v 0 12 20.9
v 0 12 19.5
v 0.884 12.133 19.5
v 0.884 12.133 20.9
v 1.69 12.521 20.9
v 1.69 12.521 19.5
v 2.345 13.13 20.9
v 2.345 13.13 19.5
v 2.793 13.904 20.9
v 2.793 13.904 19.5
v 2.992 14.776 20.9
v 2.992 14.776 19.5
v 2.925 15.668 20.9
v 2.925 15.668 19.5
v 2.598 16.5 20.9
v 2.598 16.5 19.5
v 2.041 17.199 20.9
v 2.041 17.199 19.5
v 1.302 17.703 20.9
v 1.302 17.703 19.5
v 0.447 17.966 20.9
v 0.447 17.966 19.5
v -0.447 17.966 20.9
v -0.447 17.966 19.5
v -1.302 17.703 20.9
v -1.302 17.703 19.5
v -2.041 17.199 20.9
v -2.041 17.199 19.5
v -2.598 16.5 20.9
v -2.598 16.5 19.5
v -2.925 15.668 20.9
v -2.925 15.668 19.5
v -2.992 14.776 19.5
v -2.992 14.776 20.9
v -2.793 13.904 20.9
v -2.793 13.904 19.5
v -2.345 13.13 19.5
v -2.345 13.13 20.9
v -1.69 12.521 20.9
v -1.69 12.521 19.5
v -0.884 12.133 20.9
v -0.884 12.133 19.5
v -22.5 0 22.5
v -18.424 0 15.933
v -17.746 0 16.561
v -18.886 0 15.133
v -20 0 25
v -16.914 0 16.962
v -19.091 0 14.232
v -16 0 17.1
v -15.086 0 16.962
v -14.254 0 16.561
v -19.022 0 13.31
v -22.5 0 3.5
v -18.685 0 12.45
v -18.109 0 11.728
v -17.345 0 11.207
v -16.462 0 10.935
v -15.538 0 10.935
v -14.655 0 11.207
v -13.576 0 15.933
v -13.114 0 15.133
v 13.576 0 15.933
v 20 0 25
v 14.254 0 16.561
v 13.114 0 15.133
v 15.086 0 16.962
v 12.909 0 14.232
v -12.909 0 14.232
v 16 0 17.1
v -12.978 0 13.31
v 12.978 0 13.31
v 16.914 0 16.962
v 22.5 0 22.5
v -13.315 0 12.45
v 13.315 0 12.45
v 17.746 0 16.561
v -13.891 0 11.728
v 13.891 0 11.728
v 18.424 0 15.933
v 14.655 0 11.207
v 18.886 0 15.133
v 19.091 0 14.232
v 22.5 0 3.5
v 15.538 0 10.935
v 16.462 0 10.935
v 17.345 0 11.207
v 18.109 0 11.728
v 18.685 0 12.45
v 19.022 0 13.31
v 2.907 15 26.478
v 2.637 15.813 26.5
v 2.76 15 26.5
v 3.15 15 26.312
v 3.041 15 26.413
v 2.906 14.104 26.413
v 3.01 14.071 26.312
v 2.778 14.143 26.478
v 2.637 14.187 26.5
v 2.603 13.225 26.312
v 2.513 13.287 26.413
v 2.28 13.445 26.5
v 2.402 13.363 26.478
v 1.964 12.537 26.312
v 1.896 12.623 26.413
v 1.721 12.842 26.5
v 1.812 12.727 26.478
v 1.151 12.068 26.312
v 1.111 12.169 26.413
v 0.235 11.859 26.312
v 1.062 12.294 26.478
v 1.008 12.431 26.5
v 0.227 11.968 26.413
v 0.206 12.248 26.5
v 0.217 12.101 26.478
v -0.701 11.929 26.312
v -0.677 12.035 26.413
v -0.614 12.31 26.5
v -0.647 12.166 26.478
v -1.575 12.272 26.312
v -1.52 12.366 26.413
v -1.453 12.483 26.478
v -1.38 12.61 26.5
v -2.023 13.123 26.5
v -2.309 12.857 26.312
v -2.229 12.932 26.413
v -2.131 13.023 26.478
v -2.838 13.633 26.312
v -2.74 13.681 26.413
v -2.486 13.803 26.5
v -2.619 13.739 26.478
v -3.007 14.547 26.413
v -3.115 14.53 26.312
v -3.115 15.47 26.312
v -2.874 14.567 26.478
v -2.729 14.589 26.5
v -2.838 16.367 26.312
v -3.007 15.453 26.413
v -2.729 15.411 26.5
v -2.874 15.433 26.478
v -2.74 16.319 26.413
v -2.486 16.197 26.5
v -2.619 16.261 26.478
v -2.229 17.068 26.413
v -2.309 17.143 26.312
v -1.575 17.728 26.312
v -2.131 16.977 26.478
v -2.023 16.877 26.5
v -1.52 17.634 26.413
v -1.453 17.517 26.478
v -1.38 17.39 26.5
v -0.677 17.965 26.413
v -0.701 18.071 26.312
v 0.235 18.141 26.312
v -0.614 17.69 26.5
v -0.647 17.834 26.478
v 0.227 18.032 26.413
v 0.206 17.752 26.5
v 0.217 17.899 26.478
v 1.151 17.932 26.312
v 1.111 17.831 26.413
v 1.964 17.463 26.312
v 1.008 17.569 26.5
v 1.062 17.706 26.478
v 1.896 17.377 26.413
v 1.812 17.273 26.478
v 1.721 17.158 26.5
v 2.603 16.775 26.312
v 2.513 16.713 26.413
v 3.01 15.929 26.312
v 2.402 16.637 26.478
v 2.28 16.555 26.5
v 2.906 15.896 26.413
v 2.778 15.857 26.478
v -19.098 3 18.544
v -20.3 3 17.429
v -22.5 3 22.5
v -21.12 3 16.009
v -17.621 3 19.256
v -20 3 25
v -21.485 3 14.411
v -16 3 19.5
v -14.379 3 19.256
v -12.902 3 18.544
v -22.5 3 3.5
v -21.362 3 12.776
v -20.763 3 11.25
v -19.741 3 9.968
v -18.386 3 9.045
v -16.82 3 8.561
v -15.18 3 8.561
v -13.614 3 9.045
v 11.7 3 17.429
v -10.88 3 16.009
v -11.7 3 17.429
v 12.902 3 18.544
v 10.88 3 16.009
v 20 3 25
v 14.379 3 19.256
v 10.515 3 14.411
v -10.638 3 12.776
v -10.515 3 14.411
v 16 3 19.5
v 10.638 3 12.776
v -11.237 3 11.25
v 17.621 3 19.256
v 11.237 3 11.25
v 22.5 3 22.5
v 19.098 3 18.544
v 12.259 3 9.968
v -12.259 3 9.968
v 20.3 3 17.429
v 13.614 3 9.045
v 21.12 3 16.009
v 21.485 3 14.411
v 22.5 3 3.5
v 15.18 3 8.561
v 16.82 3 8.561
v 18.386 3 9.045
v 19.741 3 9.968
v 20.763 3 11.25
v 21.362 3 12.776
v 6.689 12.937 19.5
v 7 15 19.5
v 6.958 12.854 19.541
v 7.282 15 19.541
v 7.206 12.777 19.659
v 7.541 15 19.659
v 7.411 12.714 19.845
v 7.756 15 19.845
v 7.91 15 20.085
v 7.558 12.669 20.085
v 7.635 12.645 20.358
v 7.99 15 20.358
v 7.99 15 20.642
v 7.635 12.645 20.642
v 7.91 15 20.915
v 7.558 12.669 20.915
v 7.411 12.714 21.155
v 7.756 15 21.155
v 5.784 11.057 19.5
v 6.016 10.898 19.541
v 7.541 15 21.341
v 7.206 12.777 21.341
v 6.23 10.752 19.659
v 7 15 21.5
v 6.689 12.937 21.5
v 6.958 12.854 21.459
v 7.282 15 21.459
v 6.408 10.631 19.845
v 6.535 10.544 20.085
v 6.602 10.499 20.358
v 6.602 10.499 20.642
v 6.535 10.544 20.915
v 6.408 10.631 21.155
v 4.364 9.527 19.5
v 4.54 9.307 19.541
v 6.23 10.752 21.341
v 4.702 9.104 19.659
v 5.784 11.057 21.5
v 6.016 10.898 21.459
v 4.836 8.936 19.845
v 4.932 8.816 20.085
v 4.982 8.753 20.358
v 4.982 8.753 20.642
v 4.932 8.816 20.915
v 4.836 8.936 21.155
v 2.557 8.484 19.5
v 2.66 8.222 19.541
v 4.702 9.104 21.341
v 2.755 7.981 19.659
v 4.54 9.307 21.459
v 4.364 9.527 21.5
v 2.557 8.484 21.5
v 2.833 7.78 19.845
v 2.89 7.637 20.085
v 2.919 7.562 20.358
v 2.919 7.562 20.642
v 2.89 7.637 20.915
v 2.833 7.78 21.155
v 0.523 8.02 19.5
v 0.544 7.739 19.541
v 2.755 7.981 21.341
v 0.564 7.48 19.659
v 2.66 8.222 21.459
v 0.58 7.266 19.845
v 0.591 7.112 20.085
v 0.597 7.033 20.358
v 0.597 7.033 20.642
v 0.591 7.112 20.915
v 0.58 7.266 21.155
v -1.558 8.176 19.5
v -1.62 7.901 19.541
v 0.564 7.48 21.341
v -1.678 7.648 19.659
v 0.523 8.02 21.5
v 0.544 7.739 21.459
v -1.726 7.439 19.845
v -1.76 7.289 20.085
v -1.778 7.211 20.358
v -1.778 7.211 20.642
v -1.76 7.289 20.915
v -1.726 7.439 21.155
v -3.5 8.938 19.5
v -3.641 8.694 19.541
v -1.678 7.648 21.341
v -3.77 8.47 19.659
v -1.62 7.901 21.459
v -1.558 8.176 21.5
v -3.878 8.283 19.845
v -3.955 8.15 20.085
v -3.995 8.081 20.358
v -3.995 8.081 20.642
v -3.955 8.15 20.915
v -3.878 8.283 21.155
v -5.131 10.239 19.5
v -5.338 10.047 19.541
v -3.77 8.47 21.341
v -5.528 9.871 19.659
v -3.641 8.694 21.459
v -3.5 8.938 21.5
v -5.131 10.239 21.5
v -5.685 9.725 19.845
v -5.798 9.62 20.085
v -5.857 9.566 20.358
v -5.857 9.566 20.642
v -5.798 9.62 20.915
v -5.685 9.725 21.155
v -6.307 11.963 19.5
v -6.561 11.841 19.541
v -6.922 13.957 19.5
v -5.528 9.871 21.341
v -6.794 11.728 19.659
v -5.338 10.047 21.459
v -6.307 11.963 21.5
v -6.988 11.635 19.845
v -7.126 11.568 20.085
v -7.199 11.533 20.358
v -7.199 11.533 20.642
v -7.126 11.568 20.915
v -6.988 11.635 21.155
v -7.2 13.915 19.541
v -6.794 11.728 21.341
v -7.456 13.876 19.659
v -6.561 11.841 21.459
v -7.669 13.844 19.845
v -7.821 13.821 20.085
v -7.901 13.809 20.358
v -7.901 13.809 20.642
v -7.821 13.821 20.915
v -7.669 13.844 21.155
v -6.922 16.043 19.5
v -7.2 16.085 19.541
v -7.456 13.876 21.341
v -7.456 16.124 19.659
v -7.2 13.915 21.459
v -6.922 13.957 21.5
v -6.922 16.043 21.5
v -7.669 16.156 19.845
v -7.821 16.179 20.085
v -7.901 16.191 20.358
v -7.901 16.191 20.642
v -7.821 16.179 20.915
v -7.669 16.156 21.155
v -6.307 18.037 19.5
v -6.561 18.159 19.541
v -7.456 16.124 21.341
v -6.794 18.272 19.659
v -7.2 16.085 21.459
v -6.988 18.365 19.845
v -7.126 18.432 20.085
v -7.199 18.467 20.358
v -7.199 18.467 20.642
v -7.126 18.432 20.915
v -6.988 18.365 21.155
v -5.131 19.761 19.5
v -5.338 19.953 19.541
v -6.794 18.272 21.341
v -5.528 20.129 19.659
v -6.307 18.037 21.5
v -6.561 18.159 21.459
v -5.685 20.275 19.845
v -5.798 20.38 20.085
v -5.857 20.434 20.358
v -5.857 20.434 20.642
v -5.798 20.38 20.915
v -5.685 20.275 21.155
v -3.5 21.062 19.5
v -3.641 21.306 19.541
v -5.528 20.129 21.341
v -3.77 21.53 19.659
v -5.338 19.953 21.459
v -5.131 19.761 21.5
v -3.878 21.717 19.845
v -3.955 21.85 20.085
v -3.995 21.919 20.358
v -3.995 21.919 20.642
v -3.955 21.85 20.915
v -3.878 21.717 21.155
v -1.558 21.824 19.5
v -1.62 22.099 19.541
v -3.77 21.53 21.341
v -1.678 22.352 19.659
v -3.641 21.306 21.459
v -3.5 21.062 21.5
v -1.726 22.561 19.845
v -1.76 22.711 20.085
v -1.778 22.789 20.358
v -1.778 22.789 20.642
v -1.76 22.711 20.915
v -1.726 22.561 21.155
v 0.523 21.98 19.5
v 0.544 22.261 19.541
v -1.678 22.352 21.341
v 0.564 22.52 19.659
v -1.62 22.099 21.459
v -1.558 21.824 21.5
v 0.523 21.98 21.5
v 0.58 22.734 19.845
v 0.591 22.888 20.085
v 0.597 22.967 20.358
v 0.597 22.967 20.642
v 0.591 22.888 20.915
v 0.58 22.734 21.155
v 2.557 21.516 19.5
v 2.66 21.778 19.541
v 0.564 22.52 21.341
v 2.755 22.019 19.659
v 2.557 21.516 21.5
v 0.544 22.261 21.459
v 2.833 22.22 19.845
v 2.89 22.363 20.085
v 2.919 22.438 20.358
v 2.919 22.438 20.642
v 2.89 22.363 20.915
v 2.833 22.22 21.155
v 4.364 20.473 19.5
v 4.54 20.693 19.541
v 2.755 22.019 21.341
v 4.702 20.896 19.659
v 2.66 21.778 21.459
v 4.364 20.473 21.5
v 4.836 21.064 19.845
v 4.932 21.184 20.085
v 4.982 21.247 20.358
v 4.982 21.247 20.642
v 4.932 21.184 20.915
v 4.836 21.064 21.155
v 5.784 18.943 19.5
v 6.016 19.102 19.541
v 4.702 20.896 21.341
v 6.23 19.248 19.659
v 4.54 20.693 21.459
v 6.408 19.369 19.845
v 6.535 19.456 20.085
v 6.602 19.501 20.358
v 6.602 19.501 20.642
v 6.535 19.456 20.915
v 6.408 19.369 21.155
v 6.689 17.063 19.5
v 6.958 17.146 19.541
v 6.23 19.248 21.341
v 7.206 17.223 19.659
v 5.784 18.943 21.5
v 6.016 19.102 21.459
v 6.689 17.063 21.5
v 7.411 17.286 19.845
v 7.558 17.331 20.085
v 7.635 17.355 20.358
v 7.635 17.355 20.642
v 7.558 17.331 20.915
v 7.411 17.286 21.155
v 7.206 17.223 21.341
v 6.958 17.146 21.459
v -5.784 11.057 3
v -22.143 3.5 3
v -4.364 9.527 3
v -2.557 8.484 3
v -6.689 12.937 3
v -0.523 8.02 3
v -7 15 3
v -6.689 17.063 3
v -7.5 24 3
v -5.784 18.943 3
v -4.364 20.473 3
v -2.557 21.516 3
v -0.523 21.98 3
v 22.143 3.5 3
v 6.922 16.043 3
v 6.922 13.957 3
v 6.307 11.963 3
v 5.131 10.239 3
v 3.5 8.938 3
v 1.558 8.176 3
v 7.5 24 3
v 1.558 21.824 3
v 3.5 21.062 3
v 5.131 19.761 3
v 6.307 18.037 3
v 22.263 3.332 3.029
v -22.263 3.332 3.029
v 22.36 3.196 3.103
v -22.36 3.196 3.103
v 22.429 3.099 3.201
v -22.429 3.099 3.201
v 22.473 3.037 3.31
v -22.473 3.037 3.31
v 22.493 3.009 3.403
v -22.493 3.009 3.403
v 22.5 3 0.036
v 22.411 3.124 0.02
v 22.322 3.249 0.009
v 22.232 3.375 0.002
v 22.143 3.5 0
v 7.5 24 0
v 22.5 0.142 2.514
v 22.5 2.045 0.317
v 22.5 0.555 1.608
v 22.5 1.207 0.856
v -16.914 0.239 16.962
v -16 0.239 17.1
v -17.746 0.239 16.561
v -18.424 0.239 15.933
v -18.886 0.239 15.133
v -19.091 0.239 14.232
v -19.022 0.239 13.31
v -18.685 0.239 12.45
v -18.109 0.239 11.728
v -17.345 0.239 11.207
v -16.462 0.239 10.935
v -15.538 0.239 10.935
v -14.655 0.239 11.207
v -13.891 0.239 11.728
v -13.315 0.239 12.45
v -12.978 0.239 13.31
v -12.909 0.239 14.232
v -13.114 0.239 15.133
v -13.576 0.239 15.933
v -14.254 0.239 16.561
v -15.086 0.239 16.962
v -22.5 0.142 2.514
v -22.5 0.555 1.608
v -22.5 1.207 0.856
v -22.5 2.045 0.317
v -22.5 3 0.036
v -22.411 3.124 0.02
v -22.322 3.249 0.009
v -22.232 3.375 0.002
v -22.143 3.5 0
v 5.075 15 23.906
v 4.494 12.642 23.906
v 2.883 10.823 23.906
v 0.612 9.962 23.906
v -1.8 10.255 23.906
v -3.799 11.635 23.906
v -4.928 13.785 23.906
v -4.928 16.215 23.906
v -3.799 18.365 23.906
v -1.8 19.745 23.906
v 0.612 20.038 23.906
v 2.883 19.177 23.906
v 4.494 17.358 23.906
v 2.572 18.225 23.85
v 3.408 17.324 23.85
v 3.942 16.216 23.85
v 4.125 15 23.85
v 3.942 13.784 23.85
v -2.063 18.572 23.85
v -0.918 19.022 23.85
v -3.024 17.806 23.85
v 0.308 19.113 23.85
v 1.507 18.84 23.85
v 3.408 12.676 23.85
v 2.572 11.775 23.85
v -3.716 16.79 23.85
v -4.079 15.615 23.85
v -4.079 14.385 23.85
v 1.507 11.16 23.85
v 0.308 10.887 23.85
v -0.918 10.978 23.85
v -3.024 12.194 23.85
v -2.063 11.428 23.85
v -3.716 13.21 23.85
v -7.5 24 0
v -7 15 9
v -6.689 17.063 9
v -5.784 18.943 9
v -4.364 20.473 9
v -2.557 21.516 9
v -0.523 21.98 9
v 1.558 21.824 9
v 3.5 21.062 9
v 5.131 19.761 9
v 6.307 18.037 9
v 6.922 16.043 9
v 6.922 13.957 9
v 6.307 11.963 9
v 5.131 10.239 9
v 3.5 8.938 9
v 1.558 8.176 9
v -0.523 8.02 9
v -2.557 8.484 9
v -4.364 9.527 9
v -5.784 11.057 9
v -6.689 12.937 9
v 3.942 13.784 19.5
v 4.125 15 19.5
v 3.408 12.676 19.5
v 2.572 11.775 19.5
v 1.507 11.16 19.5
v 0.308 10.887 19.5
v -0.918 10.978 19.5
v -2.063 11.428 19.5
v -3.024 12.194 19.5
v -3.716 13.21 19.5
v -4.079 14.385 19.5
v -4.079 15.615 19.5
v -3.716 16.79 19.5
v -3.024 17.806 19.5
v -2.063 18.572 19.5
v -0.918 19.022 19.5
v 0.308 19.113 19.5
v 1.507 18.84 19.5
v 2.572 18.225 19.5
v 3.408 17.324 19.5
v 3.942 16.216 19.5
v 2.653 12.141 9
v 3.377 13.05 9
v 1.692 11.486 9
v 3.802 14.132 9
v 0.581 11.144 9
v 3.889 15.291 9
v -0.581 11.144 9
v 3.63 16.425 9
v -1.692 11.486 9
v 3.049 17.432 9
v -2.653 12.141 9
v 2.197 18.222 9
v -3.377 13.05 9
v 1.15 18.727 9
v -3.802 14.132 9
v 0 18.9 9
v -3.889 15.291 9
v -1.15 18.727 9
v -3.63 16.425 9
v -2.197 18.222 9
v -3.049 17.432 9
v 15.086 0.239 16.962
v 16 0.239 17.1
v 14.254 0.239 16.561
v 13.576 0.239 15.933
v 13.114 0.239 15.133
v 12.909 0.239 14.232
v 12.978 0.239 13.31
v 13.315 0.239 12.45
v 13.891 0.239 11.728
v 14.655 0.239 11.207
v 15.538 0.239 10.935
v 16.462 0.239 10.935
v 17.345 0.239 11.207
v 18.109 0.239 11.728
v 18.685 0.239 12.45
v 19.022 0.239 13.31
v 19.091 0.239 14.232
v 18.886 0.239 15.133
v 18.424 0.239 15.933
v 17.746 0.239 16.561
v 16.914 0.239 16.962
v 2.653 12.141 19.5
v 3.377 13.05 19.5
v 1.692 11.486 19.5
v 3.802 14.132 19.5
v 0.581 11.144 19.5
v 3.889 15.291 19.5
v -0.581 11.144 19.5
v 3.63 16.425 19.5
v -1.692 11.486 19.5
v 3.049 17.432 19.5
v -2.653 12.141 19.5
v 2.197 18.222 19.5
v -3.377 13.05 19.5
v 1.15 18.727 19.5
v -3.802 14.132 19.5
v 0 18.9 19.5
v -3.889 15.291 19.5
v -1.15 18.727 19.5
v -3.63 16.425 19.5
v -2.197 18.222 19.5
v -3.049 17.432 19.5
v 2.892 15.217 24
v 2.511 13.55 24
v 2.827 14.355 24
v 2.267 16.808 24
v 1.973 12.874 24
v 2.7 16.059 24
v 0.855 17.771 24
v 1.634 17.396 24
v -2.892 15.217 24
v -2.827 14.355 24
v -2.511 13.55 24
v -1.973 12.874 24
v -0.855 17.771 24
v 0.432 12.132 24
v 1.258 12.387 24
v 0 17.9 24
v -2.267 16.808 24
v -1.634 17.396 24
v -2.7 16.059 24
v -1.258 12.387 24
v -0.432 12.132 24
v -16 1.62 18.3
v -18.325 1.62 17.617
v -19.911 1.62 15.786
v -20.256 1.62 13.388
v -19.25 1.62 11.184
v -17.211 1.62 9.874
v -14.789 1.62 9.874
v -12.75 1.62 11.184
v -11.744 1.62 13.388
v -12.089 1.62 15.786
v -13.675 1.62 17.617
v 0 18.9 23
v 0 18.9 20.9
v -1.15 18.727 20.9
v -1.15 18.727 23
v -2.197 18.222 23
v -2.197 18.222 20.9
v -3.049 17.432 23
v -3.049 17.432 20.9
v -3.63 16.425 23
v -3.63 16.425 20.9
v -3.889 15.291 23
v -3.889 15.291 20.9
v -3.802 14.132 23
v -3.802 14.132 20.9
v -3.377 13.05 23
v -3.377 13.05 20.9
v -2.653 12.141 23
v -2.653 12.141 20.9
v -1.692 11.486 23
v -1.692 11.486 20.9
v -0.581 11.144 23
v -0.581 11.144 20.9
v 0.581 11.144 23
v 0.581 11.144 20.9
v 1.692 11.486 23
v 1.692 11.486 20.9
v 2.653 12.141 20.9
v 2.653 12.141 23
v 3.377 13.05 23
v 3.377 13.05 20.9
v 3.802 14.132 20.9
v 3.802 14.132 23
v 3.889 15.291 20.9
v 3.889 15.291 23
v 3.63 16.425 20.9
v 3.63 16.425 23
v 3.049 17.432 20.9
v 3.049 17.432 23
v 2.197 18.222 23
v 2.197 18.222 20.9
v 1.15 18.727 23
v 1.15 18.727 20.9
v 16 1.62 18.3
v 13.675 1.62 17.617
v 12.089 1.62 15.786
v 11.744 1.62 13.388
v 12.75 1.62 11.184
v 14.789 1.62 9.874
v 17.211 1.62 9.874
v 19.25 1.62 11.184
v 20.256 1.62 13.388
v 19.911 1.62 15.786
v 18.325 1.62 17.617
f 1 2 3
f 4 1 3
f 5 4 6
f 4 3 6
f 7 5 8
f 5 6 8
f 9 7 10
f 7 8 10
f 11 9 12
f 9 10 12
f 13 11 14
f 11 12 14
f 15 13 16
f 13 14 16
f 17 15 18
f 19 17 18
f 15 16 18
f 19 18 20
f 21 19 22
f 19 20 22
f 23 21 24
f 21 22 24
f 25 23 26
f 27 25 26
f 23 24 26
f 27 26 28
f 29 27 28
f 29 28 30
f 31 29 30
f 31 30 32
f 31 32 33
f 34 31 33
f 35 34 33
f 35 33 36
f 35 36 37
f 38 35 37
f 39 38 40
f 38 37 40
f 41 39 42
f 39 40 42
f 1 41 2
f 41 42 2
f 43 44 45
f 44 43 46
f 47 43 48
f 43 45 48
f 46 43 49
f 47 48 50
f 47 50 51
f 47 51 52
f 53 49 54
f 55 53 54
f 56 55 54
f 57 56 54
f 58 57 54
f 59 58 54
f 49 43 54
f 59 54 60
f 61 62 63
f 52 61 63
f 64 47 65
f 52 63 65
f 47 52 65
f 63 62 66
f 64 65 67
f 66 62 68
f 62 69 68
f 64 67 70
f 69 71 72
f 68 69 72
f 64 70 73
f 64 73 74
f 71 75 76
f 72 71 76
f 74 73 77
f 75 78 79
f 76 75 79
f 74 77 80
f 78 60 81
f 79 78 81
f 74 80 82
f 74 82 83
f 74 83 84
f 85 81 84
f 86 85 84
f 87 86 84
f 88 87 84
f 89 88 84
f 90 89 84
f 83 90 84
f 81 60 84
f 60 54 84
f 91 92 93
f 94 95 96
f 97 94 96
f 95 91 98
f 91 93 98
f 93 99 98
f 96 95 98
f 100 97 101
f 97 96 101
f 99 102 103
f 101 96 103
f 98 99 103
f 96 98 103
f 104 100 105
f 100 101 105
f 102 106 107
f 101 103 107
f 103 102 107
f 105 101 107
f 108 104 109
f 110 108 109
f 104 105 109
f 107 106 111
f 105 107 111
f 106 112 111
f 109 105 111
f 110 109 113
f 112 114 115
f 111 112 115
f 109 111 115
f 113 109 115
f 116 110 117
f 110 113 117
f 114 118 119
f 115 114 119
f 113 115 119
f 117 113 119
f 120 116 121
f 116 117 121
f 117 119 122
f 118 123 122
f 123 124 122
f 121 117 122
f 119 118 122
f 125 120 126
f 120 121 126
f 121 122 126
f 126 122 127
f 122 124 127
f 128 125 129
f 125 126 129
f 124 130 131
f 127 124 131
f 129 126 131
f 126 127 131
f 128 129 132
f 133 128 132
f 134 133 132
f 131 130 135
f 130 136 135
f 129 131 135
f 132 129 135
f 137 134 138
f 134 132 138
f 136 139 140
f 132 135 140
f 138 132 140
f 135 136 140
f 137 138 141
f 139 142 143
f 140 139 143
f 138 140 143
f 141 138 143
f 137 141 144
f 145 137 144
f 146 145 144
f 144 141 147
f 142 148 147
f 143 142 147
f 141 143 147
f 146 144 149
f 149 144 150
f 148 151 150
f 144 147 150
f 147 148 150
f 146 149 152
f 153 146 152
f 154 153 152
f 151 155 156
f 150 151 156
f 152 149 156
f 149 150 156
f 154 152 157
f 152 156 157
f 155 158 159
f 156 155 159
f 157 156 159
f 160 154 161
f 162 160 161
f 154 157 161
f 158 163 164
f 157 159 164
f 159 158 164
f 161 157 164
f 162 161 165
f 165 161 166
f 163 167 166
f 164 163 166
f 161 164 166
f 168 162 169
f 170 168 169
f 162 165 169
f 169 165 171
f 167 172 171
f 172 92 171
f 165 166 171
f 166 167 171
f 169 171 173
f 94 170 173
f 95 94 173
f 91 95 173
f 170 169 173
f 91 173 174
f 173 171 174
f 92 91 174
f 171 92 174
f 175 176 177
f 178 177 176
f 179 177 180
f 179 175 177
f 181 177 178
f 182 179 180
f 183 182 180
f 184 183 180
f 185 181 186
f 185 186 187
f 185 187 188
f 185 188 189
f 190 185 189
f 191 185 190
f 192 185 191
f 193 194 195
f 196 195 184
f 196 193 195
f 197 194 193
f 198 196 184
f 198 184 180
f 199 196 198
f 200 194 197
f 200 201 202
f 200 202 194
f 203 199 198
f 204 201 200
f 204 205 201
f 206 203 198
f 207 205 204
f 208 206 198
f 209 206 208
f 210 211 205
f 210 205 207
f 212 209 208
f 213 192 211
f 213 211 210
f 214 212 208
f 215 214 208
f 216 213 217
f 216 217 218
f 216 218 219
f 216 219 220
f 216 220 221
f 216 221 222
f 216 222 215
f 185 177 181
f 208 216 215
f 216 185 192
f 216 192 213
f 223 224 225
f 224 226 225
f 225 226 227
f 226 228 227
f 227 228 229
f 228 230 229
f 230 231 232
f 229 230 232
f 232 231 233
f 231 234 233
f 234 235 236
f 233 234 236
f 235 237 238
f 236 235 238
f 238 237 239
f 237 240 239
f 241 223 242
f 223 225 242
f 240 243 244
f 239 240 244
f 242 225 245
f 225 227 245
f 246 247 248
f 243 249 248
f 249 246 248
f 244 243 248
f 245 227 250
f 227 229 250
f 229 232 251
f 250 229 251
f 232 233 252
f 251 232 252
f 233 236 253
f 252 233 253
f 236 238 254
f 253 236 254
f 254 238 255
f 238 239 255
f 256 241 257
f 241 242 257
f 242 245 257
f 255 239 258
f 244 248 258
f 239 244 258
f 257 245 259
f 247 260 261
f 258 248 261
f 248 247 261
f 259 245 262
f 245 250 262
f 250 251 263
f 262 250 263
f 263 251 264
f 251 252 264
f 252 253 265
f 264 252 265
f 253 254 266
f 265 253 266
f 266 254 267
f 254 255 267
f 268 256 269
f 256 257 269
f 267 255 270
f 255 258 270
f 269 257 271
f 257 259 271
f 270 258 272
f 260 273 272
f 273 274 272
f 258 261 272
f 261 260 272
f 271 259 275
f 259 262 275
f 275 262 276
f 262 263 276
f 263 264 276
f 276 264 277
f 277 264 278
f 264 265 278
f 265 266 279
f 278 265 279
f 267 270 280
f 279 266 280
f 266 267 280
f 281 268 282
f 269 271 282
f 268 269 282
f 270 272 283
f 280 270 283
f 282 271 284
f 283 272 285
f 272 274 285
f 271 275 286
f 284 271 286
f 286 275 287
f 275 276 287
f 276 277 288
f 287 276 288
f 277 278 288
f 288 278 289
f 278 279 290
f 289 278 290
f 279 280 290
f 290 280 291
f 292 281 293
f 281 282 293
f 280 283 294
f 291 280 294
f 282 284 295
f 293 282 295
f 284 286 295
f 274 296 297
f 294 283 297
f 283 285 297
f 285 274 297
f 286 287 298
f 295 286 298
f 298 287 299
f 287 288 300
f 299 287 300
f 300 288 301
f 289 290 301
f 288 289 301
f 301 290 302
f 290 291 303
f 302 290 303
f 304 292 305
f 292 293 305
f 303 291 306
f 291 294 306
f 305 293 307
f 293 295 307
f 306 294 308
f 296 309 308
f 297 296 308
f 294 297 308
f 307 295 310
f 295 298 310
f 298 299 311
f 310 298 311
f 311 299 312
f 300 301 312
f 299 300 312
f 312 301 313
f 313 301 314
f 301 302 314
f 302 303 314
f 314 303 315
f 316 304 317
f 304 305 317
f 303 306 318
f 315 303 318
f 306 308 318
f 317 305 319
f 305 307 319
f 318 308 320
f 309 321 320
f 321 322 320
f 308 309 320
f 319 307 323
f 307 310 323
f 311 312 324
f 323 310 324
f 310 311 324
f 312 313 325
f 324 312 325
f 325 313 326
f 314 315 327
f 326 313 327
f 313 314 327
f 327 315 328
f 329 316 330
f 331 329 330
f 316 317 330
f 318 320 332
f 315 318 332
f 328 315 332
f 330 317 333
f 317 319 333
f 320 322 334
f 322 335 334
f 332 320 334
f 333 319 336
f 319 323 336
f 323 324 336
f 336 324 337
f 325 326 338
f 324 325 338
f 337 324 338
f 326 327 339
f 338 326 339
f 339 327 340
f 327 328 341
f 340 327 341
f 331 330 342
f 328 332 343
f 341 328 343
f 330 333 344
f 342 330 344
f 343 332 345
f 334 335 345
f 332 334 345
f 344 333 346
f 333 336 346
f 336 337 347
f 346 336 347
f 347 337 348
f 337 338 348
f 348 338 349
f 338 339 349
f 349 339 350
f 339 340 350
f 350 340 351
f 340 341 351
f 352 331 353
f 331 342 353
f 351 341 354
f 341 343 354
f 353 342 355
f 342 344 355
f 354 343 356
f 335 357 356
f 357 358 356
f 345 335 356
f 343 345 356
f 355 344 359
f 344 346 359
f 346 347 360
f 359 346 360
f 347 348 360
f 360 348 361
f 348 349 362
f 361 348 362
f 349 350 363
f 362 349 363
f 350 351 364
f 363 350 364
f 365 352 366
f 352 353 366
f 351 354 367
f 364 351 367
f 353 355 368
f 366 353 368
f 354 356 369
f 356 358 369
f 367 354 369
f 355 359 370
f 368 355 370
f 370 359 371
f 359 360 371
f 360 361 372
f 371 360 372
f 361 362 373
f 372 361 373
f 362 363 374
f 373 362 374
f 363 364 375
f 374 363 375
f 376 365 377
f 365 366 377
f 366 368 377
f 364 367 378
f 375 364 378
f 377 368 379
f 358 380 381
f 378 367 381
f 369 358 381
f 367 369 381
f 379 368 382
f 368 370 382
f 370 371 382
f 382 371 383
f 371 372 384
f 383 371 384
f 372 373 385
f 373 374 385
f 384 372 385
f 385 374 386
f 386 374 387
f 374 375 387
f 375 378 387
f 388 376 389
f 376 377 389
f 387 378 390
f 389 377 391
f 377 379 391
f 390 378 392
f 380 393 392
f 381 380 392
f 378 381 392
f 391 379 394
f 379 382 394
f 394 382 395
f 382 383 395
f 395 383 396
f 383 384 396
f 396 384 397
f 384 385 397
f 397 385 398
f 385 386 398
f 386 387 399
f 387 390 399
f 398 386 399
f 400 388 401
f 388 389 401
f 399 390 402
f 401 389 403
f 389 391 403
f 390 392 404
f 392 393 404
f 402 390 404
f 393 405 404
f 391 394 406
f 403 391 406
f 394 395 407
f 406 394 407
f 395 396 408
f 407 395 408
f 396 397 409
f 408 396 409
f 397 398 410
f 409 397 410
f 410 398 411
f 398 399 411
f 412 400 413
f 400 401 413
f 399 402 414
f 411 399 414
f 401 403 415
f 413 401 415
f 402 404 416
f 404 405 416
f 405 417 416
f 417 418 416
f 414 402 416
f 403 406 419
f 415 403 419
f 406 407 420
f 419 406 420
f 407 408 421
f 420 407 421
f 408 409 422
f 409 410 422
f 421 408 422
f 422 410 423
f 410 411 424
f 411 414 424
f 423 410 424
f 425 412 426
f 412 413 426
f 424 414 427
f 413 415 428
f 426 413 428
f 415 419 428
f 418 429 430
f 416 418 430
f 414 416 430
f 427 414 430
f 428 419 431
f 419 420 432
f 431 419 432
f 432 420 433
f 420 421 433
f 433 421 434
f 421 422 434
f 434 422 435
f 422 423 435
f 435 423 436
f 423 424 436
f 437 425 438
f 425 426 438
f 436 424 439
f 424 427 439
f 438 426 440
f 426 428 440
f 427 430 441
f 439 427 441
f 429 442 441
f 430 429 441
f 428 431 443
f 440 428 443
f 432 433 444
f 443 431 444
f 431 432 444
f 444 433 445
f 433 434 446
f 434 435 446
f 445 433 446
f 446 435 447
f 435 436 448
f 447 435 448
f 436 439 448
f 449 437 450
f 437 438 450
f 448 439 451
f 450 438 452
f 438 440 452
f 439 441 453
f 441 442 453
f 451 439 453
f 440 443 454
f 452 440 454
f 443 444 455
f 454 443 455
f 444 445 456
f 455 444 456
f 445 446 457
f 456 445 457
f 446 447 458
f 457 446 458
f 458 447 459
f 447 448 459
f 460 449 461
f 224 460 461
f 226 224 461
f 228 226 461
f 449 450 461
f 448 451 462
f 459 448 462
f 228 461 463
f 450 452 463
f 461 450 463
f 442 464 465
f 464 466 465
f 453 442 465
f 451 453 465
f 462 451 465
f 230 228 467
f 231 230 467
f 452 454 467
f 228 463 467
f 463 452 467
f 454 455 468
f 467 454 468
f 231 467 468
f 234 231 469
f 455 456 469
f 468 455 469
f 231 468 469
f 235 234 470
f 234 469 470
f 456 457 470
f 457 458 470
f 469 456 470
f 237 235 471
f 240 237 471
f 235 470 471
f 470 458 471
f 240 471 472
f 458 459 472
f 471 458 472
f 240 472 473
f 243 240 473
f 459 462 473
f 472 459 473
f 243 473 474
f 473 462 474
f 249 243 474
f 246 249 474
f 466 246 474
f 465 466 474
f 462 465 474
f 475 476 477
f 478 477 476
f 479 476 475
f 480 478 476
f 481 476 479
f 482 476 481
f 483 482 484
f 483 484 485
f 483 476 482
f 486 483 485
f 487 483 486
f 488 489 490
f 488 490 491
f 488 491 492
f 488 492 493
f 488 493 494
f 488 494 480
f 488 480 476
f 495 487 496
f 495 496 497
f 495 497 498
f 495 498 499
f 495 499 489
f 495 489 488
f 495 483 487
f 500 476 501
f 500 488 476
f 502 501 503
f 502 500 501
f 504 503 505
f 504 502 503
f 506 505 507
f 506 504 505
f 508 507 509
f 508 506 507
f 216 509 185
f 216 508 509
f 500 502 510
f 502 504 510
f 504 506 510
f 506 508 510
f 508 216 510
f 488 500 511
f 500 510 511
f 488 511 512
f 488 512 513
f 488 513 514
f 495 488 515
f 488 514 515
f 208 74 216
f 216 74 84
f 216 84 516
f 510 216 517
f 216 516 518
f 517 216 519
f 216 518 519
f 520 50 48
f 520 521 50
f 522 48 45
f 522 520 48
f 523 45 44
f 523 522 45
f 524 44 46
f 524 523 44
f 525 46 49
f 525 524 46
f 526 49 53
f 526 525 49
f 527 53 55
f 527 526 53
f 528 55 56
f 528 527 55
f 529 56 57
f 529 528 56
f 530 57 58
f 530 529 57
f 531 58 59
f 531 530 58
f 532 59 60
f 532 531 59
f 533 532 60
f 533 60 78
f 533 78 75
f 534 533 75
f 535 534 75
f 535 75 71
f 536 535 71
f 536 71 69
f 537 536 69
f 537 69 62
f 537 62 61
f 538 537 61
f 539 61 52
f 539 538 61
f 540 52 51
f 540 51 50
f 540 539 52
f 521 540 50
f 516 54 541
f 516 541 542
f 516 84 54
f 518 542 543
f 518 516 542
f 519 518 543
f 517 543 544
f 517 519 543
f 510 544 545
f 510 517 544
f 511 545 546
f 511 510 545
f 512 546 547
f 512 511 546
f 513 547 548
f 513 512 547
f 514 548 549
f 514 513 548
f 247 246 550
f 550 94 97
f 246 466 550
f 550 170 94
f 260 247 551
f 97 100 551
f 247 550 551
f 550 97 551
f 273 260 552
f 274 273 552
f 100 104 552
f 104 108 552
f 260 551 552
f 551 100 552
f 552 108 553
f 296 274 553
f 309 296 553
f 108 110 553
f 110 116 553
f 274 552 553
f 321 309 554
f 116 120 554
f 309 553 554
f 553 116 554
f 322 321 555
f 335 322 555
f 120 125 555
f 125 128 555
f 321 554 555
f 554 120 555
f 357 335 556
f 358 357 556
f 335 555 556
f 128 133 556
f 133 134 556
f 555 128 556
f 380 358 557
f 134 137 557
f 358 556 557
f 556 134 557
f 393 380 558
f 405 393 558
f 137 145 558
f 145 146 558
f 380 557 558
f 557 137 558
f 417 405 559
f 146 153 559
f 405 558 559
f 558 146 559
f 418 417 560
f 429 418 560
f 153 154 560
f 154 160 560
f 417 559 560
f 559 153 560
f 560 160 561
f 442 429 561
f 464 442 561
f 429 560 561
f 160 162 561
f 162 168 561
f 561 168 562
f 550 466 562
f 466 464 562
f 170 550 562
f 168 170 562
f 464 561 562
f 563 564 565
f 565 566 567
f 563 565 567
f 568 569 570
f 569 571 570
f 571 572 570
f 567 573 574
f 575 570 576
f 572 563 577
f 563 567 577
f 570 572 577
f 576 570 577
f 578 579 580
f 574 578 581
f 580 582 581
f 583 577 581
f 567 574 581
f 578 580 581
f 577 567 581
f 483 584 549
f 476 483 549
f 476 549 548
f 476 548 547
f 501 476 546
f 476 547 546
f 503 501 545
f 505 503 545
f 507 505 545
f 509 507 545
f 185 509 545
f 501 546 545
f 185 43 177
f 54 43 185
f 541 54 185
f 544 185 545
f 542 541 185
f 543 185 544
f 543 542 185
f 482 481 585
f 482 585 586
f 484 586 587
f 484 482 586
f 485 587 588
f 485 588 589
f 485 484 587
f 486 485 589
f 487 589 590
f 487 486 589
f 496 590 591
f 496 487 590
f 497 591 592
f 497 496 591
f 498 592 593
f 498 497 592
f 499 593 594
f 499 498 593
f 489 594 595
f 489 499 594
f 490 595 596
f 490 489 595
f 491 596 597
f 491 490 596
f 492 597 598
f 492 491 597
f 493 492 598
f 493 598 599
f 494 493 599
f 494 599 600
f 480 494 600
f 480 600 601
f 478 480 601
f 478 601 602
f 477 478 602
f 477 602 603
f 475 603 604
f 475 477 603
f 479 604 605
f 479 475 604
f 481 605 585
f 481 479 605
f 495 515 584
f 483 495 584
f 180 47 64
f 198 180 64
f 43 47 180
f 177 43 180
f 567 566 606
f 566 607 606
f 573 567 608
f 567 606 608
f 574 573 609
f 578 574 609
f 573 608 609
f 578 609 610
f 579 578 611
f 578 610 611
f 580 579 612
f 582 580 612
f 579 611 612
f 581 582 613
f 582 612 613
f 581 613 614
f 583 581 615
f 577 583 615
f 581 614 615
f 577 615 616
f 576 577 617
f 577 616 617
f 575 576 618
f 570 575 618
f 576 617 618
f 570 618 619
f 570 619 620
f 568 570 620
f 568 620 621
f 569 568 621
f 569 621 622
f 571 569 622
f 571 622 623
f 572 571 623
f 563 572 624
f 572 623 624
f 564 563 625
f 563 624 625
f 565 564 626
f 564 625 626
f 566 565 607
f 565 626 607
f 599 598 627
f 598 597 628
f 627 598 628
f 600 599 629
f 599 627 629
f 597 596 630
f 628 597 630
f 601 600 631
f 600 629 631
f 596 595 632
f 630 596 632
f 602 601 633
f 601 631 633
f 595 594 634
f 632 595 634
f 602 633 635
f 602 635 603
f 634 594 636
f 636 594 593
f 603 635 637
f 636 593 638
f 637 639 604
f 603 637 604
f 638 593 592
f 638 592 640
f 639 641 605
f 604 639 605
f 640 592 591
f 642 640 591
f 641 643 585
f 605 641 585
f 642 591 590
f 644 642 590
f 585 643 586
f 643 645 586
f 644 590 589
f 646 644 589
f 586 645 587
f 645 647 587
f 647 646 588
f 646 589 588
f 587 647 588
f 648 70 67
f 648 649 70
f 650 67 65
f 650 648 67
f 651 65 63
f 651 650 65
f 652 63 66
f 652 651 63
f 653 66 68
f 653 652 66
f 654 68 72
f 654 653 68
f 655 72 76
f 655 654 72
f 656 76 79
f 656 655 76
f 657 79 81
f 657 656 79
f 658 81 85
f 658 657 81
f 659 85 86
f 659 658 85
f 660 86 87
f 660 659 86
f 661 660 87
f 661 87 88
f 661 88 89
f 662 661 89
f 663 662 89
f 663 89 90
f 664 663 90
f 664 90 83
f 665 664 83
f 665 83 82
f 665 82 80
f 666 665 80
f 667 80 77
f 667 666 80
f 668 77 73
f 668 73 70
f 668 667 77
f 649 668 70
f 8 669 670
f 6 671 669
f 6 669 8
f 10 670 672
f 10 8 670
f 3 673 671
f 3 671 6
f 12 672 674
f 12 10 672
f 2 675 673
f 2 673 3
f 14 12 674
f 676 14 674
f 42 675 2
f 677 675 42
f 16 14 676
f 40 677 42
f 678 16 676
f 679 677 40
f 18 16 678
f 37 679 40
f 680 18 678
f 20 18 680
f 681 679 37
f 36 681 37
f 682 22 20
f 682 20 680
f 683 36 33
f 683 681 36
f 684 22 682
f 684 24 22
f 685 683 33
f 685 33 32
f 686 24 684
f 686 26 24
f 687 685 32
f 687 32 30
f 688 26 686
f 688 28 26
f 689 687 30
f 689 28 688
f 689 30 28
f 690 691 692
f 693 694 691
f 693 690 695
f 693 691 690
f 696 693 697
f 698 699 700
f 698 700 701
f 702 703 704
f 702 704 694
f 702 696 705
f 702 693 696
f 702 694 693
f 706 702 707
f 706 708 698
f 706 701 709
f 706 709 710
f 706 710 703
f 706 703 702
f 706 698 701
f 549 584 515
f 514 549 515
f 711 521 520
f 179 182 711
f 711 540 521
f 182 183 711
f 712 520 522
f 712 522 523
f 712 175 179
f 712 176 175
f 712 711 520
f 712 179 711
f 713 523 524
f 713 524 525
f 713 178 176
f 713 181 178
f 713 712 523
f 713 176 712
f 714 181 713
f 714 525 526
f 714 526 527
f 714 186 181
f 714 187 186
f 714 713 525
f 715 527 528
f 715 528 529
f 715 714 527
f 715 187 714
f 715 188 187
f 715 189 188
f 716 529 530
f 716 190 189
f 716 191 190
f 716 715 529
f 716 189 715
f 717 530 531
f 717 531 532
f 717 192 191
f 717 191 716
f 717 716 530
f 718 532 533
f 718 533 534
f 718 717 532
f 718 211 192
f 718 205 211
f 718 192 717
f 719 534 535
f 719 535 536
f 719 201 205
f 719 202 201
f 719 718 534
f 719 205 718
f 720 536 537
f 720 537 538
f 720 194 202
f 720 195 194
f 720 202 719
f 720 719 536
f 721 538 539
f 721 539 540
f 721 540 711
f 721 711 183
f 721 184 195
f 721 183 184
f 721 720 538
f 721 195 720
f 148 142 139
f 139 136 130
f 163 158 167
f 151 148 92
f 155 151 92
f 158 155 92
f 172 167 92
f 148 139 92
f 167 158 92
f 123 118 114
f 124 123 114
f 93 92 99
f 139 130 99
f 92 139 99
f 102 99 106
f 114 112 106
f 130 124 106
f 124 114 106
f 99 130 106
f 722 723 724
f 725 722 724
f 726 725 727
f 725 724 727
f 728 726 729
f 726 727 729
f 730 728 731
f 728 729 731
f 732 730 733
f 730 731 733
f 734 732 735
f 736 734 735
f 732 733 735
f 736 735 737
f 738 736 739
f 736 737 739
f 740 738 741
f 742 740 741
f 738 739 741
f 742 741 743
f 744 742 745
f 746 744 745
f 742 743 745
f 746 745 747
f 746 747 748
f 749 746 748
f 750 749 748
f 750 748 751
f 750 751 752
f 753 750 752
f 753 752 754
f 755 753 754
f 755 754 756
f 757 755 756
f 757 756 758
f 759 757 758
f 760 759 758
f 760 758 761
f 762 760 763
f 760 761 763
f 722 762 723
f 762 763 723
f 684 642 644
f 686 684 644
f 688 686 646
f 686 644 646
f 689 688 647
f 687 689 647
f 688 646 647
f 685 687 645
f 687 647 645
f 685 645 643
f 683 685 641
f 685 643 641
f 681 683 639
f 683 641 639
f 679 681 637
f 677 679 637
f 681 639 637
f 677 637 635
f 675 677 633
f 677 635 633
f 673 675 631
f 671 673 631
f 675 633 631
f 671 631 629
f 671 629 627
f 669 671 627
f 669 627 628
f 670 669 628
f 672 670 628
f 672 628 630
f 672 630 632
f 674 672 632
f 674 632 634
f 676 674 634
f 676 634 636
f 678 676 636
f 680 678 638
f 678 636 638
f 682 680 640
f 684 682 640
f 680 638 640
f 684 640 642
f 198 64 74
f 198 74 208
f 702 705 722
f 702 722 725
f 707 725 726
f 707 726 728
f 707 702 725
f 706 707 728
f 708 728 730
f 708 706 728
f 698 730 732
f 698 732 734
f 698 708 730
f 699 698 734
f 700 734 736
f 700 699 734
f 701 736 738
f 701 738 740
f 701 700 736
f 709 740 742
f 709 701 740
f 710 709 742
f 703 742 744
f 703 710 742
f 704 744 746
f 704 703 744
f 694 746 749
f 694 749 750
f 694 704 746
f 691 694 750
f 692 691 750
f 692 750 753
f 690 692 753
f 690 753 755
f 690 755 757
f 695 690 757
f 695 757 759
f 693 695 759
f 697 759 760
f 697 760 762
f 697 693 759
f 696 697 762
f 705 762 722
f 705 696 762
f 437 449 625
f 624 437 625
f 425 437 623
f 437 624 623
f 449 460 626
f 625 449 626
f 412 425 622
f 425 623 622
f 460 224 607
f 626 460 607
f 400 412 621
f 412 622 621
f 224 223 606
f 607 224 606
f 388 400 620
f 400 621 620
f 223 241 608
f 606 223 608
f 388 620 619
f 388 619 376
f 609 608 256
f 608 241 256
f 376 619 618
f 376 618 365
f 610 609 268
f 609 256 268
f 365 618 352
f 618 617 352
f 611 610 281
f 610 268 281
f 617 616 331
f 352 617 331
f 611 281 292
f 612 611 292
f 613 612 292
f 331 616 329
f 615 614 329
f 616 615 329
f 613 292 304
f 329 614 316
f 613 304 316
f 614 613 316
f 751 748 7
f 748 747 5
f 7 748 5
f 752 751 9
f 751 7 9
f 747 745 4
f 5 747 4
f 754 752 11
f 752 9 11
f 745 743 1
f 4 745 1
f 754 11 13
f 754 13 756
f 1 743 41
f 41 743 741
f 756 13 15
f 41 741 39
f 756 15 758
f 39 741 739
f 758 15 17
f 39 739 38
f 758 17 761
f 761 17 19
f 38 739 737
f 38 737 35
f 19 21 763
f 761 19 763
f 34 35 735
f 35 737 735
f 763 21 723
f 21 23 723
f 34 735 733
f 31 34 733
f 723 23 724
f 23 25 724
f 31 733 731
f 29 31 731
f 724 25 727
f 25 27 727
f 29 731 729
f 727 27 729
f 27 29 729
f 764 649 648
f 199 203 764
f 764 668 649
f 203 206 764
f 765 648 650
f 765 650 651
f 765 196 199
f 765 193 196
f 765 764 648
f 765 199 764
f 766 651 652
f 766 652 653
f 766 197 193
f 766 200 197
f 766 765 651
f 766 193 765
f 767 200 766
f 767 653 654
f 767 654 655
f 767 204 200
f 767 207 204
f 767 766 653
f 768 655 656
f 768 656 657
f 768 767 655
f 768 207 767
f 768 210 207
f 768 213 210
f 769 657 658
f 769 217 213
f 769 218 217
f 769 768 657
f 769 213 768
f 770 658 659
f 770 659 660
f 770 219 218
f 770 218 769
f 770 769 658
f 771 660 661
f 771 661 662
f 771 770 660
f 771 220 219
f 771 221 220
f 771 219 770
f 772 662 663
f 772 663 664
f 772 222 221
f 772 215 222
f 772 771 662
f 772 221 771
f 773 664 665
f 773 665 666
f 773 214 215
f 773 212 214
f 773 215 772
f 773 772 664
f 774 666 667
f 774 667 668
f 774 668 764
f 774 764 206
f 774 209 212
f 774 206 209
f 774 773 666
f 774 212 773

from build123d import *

# Parameters (mm, degrees)
SKETCH1_W        = 45
SKETCH1_H        = 25
EXTRUDE1_DEPTH   = 3
EXTRUDE7_DEPTH   = 3
FILLET3_R        = 0.5
FILLET4_R        = 3.5
HOLE1_AT_2_COUNT = 2
HOLE1_AT_2_PITCH = 32
SKETCH4_R        = 7
EXTRUDE2_DEPTH   = 6
SKETCH5_R        = 3.9
EXTRUDE3_DEPTH   = 10.5
SKETCH6_R        = 3
EXTRUDE4_DEPTH   = 1.4
SKETCH7_R        = 3.9
EXTRUDE6_DEPTH   = 3.1
CHAMFER2_SIZE    = 1
FILLET1_R        = 0.5
CHAMFER1_SIZE    = 2.5


with BuildPart() as part:
    # Sketch1 → Extrude1 (new body)
    with BuildSketch(Plane(origin=(0, 0, 0), x_dir=(1, 0, 0), z_dir=(0, 1, 0))):
        with Locations((0, -12.5)):
            Rectangle(SKETCH1_W, SKETCH1_H)
    extrude(amount=EXTRUDE1_DEPTH)

    # Sketch12 → Extrude7 (add)
    with BuildSketch(Plane.XY):
        Polygon((22.5, 3), (7.5, 24), (-7.5, 24), (-22.5, 3), align=None)
    extrude(amount=EXTRUDE7_DEPTH)

    # Fillet3
    fillet3_edges = [part.edges().sort_by_distance(p)[0] for p in [
        (0, 3, 3),
    ]]
    fillet(fillet3_edges, radius=FILLET3_R)

    # Fillet4
    fillet4_edges = [part.edges().sort_by_distance(p)[0] for p in [
        (0, 0, 0),
    ]]
    fillet(fillet4_edges, radius=FILLET4_R)

    # Sketch2 → Hole1 (revolve, cut)
    with BuildSketch(Plane(origin=(16, 3, 14), x_dir=(0, 0, 1), z_dir=(1, 0, 0))):
        Polygon((0, 0), (0, 3), (3.1, 3), (3.1, 2.760884177), (5.5, 0), align=None)
    hole1 = revolve(axis=Axis((16, 9.445314094, 14), (0, -1, 0)), mode=Mode.SUBTRACT)

    # Hole1 at 2: Hole1 ×2
    with Locations(*[(-i * HOLE1_AT_2_PITCH, 0, 0) for i in range(1, HOLE1_AT_2_COUNT)]):
        add(hole1, mode=Mode.SUBTRACT)

    # Sketch4 → Extrude2 (add)
    with BuildSketch(Plane(origin=(0, 0, 3), x_dir=(-1, 0, 0), z_dir=(0, 0, -1))):
        with Locations((0, 15)):
            Circle(SKETCH4_R)
    extrude(amount=-EXTRUDE2_DEPTH)

    # Sketch5 → Extrude3 (add)
    with BuildSketch(Plane(origin=(0, 0, 9), x_dir=(-1, 0, 0), z_dir=(0, 0, 1))):
        with Locations(Location((0, -15, 0), (0, 0, 270))):
            Circle(SKETCH5_R)
    extrude(amount=EXTRUDE3_DEPTH)

    # Sketch6 → Extrude4 (add)
    with BuildSketch(Plane(origin=(0, 0, 19.5), x_dir=(-1, 0, 0), z_dir=(0, 0, 1))):
        with Locations(Location((0, -15, 0), (0, 0, 90))):
            Circle(SKETCH6_R)
    extrude(amount=EXTRUDE4_DEPTH)

    # Sketch7 → Extrude6 (add)
    with BuildSketch(Plane(origin=(0, 0, 20.9), x_dir=(-1, 0, 0), z_dir=(0, 0, 1))):
        with Locations(Location((0, -15, 0), (0, 0, 270))):
            Circle(SKETCH7_R)
    extrude(amount=EXTRUDE6_DEPTH)

    # Chamfer2
    chamfer2_edges = [part.edges().sort_by_distance(p)[0] for p in [
        (0, 11.1, 24),
    ]]
    chamfer(chamfer2_edges, length=CHAMFER2_SIZE)

    # Chamfer1
    chamfer1_edges = [part.edges().sort_by_distance(p)[0] for p in [
        (22.5, 1.5, 25),
        (-22.5, 1.5, 25),
    ]]
    chamfer(chamfer1_edges, length=CHAMFER1_SIZE)


with BuildPart() as body_2:
    # Sketch8 → Revolve1 (revolve)
    with BuildSketch(Plane(origin=(0, 15, 0), x_dir=(1, 0, 0), z_dir=(0, 1, 0)), mode=Mode.PRIVATE) as revolve1_sk:
        with BuildLine():
            Line((-7, -21.5), (-3, -26.5))
            Line((-3, -26.5), (0, -26.5))
            Line((0, -26.5), (0, -23.85))
            Line((0, -23.85), (-4.125, -23.85))
            Line((-4.125, -23.85), (-4.125, -19.5))
            Line((-4.125, -19.5), (-7, -19.5))
            ThreePointArc((-7, -19.5), (-8, -20.5), (-7, -21.5))
        make_face()
    revolve(revolve1_sk.sketch.rotate(Axis((0, 15, 19.5), (0, 0, -1)), 180), axis=Axis((0, 15, 19.5), (0, 0, -1)))

    # Fillet1
    fillet1_edges = [body_2.edges().sort_by_distance(p)[0] for p in [
        (-3, 15, 26.5),
    ]]
    fillet(fillet1_edges, radius=FILLET1_R)


solid = Compound([part.part, body_2.part])
